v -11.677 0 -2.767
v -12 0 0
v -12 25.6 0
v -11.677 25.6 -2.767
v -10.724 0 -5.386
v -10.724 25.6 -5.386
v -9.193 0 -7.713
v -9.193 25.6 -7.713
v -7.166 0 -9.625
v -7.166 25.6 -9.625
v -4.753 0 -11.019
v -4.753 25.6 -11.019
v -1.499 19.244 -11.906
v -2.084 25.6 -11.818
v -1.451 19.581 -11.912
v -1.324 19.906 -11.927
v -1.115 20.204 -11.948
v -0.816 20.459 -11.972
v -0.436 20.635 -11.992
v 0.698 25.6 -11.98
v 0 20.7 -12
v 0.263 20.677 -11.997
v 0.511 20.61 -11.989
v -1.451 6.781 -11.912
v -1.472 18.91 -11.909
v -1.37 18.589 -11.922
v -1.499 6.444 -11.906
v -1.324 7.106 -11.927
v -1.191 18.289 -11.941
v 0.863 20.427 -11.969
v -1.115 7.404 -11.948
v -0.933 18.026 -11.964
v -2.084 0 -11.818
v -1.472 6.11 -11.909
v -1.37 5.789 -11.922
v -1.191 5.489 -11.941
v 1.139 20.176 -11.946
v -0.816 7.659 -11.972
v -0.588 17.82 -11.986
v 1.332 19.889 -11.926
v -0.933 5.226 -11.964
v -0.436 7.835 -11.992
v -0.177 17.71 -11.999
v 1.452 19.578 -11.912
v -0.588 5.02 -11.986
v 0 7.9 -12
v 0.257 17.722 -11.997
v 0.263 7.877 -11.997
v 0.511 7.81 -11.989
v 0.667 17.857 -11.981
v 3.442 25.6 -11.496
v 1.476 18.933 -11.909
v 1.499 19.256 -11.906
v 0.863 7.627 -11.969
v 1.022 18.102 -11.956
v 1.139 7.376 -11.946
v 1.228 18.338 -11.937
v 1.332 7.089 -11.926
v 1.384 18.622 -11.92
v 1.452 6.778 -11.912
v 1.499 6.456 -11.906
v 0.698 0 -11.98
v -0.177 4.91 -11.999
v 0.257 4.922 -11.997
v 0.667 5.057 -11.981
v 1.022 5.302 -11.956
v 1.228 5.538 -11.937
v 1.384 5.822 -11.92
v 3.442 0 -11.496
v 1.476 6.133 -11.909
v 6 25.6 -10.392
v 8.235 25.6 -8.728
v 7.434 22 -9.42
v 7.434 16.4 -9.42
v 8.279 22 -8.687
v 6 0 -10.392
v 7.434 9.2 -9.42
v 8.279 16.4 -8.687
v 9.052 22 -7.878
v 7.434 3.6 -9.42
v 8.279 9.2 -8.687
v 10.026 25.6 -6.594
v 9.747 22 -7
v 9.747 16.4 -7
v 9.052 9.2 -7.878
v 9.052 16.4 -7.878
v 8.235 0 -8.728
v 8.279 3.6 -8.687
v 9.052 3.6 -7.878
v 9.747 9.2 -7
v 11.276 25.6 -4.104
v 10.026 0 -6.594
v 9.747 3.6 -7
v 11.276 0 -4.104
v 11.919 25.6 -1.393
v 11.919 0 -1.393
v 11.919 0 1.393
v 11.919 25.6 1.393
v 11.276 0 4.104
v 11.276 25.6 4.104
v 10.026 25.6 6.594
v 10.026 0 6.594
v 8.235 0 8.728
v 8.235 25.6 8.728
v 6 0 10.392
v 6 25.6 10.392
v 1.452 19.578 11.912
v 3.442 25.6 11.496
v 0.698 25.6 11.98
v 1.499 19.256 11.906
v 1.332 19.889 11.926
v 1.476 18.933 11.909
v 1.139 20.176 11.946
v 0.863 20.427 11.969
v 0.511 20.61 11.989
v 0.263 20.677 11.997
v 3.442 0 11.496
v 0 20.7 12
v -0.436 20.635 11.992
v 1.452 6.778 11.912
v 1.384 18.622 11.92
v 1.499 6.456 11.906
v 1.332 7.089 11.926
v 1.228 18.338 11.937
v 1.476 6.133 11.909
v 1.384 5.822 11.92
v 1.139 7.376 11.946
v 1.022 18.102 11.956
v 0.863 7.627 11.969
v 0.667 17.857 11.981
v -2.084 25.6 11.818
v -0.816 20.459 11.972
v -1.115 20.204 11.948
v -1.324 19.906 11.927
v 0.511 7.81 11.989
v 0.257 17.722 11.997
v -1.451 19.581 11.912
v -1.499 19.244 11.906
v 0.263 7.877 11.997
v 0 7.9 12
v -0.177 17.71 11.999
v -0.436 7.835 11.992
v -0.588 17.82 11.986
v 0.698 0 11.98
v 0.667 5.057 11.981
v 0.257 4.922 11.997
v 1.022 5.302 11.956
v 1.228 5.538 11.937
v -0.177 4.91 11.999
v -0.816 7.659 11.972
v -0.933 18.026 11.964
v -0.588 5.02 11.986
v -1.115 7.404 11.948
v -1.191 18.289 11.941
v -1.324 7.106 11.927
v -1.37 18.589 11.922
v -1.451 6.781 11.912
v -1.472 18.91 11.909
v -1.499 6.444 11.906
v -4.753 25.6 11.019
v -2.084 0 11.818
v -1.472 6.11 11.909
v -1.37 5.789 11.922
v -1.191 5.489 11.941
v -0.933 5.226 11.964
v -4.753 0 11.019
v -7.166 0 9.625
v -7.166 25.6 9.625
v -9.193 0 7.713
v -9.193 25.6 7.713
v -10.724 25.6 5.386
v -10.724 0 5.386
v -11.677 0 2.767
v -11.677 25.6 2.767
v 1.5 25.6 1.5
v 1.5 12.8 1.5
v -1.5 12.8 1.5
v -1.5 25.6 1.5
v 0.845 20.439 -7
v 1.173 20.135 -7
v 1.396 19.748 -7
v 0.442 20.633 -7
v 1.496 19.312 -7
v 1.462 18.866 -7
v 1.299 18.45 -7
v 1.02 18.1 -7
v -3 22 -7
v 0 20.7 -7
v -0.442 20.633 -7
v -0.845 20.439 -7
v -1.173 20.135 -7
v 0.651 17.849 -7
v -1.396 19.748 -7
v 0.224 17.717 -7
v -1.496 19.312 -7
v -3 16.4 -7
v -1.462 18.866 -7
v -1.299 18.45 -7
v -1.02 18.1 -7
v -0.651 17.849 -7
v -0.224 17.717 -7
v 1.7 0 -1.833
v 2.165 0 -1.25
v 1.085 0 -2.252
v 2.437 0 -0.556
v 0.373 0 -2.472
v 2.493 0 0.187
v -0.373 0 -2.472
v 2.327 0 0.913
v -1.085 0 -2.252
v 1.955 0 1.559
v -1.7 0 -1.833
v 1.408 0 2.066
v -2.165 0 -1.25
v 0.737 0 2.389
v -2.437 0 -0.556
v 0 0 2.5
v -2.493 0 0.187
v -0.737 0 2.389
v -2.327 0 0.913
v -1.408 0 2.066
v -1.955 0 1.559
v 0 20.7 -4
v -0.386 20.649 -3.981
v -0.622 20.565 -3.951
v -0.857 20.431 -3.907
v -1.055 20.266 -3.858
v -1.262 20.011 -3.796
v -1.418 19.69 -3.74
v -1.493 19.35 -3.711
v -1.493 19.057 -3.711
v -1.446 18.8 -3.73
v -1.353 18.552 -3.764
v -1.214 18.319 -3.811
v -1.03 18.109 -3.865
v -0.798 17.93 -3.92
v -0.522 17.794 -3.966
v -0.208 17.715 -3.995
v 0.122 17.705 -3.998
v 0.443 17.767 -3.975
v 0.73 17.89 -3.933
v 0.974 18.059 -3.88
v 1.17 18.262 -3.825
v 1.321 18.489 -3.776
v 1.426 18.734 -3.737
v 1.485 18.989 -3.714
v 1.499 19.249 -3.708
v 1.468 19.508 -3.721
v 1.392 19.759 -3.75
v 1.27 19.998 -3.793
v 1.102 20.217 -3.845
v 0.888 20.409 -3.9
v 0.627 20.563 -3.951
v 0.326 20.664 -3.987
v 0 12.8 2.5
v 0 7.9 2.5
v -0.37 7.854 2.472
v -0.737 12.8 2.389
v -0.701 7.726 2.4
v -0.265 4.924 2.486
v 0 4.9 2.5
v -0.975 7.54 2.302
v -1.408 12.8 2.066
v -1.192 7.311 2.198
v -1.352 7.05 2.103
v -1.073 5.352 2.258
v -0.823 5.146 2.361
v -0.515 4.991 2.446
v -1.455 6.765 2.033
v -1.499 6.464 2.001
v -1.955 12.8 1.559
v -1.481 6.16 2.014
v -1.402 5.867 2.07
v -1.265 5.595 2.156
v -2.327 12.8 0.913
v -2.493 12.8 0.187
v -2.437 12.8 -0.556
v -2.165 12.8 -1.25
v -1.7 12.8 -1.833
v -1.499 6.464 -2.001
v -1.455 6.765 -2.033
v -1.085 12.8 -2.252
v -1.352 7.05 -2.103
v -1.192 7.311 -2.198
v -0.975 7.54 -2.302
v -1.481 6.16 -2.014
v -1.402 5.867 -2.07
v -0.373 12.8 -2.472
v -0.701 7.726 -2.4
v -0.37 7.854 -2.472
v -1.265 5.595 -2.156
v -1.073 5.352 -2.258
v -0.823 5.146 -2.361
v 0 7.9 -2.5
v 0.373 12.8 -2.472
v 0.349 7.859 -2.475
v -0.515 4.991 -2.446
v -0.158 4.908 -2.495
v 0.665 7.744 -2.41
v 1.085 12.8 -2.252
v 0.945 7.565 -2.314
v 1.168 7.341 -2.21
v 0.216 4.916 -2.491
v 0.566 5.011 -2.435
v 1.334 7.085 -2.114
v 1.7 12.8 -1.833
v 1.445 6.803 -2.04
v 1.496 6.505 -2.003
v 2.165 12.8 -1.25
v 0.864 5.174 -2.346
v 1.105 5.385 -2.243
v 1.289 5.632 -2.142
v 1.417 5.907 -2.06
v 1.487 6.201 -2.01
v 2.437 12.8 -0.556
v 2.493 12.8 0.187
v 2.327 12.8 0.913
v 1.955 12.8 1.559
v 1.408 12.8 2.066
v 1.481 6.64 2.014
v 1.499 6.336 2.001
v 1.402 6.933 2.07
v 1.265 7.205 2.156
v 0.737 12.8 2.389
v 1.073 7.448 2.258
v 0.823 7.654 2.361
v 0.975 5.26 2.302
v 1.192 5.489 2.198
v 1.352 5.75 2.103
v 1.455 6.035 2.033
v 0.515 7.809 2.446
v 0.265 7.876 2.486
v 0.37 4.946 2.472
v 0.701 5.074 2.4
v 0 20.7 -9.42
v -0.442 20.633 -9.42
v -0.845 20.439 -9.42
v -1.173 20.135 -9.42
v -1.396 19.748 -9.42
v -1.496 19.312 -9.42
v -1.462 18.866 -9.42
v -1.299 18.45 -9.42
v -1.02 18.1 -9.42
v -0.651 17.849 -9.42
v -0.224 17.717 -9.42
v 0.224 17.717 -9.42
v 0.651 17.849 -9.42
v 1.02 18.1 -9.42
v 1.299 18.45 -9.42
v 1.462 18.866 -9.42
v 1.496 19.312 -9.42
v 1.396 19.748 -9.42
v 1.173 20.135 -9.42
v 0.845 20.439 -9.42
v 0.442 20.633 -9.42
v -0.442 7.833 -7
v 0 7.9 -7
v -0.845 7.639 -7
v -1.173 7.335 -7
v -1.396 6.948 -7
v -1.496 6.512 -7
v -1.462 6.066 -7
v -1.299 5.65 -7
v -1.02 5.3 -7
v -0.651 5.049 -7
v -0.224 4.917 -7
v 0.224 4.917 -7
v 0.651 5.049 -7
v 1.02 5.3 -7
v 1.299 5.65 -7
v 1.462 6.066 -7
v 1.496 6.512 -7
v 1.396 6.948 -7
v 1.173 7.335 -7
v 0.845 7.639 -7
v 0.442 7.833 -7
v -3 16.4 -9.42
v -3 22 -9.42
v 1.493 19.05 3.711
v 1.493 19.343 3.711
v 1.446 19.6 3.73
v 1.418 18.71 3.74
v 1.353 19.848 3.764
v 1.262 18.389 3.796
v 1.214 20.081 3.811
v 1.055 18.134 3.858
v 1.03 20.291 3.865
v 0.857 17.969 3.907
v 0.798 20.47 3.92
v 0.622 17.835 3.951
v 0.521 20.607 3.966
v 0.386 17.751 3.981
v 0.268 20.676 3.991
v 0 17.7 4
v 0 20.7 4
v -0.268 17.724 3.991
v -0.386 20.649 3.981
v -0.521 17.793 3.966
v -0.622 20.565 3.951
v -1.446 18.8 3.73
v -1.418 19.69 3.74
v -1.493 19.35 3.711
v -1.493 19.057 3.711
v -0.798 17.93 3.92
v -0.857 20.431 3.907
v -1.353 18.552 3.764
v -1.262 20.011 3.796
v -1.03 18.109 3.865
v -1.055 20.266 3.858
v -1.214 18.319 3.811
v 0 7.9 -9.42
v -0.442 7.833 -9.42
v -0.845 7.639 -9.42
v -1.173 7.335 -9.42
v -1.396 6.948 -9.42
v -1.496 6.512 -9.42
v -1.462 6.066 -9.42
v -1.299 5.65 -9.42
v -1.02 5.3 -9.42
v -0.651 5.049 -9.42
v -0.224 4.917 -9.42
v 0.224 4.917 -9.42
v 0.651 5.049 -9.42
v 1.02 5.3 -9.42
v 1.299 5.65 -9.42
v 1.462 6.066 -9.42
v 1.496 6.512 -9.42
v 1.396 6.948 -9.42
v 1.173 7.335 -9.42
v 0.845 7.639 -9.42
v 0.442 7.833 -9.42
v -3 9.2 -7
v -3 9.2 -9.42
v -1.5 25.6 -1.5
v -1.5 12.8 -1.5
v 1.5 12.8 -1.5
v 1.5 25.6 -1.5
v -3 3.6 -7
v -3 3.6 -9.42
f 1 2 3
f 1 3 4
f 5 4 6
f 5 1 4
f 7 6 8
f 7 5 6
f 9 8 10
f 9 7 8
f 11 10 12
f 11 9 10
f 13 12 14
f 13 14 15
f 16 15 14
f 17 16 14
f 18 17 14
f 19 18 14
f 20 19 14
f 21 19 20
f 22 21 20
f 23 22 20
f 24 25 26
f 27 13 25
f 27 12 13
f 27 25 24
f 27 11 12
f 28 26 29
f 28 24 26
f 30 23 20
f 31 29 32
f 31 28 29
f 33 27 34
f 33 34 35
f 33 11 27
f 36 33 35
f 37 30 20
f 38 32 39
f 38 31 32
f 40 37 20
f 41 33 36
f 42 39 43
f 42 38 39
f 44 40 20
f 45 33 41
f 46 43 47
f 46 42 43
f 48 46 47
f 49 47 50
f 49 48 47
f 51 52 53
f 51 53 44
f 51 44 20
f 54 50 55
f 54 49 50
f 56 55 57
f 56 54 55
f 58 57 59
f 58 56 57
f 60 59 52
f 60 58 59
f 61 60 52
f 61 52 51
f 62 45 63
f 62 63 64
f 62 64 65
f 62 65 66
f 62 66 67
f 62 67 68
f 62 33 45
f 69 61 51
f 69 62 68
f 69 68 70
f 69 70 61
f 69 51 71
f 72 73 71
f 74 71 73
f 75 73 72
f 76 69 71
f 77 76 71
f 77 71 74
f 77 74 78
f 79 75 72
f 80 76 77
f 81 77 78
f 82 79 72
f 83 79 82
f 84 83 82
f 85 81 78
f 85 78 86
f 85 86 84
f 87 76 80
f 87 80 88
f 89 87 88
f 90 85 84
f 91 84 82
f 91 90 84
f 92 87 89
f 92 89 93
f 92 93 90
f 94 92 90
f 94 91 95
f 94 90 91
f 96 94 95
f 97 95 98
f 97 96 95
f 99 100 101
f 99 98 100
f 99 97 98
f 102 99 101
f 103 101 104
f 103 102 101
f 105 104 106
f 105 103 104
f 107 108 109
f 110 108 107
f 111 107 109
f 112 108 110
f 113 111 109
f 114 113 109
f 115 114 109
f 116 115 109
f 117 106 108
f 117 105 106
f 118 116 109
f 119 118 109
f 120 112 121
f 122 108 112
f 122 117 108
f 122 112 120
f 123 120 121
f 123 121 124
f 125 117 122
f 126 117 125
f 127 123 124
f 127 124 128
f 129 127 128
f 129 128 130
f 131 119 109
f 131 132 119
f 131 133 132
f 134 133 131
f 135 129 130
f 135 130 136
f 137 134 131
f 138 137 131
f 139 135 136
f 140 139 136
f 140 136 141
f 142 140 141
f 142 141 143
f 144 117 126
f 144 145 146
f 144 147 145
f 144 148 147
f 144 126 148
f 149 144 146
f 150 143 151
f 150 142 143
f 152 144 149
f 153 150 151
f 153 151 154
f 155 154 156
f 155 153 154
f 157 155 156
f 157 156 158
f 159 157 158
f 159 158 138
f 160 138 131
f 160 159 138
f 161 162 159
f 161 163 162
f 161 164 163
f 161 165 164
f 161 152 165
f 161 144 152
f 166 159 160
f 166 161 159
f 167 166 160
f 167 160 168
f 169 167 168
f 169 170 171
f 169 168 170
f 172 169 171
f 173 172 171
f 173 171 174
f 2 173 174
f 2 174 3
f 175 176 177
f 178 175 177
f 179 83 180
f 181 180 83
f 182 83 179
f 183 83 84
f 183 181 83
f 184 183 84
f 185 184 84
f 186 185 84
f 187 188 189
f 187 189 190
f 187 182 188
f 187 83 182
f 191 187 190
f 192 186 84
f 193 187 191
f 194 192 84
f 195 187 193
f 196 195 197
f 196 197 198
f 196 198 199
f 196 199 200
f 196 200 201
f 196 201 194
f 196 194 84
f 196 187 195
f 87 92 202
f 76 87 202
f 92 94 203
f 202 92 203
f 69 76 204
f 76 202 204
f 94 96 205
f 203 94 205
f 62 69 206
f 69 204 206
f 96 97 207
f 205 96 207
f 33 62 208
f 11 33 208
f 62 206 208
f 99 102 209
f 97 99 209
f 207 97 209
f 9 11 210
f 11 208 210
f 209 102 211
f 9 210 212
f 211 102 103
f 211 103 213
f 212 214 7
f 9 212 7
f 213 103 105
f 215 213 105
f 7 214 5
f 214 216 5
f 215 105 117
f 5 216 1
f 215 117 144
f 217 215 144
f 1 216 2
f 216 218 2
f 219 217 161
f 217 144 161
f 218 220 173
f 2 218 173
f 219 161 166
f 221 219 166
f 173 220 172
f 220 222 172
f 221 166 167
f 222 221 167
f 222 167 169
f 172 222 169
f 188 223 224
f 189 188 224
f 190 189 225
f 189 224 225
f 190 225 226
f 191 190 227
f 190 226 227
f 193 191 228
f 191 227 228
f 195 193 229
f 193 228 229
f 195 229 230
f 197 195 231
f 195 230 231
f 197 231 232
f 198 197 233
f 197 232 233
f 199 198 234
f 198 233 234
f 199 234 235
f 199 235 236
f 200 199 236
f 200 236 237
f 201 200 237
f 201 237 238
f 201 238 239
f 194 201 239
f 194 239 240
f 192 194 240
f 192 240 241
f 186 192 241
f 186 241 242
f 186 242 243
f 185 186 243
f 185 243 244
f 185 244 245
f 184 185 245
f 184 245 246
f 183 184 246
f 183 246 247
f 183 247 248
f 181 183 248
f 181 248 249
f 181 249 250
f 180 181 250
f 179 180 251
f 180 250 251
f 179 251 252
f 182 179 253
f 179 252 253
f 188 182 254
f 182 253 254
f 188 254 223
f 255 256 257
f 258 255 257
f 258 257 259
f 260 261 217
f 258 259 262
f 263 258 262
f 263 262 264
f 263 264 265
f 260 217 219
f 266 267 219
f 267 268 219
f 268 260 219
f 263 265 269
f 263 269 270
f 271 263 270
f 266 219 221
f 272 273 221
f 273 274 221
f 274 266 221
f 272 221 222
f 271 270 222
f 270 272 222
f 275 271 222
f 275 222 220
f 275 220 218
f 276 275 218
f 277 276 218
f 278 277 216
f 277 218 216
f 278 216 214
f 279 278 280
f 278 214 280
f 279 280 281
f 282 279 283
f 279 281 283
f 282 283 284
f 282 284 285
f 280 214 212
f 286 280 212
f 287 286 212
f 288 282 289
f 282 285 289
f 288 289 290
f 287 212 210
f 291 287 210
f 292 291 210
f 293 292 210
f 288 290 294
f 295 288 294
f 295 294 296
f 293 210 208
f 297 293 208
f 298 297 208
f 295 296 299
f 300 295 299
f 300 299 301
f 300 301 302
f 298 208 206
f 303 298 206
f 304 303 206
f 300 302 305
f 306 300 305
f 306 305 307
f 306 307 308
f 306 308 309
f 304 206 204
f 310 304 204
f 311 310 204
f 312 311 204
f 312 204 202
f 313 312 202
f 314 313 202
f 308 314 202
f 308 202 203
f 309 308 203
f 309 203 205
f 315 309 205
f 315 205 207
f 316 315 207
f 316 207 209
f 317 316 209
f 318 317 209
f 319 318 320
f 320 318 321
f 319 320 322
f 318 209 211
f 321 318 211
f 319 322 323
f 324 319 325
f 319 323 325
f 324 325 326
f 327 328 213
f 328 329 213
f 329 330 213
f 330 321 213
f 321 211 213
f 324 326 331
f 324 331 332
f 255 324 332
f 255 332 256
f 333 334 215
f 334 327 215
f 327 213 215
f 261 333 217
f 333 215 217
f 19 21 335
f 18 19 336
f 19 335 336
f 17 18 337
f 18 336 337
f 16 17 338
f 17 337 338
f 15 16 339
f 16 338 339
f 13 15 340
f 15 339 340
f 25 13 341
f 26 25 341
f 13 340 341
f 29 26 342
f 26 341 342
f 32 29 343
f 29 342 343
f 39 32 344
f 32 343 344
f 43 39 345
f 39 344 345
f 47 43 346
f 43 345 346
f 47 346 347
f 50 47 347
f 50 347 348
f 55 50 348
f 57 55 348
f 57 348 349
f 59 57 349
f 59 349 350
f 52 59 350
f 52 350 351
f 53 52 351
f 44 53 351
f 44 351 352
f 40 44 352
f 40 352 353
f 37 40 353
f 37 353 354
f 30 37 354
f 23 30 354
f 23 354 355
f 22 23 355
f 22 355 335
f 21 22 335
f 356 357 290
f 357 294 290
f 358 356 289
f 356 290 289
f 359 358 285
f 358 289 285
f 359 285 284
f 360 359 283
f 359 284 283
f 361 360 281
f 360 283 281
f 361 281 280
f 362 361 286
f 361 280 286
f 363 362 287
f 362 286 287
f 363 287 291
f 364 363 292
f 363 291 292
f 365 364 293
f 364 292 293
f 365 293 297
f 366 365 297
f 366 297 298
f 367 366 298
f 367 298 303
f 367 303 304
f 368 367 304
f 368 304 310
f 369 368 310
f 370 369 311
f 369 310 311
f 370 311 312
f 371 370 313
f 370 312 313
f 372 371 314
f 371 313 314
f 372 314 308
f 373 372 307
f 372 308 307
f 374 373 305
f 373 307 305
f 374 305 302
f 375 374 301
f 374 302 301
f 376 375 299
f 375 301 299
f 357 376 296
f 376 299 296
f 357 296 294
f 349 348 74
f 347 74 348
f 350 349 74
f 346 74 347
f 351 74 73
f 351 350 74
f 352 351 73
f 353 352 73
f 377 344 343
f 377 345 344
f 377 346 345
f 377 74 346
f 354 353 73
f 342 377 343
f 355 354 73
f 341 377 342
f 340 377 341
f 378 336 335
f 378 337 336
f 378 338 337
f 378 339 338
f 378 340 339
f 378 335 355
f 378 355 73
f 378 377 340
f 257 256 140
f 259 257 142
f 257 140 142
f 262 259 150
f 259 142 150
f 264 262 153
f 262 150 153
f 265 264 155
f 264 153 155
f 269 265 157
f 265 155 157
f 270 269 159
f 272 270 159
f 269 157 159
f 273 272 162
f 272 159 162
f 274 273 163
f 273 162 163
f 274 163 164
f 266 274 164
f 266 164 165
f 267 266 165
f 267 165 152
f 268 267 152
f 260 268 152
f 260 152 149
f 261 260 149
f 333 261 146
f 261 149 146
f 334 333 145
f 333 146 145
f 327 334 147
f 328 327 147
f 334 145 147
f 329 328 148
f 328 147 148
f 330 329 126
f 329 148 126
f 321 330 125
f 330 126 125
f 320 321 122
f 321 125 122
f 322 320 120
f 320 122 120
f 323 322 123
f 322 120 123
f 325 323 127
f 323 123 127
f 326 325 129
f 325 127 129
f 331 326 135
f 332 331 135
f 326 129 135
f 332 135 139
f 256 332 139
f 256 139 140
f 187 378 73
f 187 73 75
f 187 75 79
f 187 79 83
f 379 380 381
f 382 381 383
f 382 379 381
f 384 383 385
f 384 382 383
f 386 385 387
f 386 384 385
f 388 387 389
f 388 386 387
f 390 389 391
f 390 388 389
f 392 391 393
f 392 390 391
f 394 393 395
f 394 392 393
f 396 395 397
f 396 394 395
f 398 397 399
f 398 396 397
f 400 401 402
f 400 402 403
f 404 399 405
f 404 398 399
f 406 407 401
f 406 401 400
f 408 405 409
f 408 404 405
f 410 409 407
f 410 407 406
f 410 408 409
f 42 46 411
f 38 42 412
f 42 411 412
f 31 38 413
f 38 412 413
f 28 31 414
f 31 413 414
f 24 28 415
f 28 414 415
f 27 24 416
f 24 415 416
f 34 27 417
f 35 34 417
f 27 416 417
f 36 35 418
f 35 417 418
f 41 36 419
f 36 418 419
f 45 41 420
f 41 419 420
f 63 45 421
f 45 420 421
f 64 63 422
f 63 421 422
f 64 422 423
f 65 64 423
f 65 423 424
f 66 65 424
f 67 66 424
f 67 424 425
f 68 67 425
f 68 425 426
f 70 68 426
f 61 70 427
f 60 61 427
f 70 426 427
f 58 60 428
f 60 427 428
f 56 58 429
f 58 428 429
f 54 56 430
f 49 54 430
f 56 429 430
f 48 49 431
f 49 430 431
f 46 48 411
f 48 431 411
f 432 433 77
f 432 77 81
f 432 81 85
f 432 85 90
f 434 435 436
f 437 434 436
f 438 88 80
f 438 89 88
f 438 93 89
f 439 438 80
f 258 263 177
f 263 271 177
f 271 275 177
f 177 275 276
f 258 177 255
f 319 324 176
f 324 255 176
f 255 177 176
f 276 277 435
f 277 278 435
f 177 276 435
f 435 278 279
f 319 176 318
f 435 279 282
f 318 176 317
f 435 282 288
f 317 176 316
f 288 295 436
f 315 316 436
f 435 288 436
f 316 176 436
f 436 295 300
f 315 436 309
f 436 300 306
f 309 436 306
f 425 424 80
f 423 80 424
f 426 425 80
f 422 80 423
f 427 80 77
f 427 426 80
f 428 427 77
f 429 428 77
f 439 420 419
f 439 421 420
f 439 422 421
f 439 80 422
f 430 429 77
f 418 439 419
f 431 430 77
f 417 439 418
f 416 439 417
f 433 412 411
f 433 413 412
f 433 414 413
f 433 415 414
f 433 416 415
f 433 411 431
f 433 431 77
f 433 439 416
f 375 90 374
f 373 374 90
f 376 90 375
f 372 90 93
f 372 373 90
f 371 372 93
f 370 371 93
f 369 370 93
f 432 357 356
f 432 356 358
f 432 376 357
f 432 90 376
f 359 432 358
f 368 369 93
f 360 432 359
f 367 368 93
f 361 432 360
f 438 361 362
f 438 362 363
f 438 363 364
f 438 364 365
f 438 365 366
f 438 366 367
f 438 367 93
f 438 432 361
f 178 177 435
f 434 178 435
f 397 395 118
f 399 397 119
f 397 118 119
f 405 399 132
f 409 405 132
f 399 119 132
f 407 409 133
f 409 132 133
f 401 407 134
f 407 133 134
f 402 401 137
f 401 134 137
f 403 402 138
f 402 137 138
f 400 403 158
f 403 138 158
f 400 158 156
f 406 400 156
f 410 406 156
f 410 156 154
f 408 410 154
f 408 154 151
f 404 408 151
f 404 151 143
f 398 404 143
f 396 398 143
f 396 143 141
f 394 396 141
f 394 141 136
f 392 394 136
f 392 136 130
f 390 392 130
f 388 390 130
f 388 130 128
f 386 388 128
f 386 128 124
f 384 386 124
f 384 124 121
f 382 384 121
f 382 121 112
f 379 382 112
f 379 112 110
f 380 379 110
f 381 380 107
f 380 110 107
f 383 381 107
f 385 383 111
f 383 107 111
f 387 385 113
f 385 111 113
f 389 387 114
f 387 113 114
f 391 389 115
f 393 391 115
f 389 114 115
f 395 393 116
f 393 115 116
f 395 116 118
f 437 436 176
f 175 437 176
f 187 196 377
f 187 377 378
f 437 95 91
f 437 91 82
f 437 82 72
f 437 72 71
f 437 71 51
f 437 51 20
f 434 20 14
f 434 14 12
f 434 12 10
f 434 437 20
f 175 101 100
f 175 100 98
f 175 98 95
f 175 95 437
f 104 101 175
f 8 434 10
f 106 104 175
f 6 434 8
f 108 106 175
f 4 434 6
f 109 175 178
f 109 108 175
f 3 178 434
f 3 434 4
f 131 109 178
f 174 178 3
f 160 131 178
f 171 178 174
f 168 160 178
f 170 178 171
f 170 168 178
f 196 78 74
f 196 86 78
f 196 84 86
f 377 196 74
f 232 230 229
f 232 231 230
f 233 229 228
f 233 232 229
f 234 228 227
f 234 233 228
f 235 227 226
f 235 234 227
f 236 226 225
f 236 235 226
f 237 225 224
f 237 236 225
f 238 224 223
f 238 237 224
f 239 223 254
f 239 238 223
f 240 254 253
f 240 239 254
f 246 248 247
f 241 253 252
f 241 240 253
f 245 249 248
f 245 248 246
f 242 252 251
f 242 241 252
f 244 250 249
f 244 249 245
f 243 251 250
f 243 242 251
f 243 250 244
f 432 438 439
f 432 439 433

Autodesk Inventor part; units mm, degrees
ref_plane "YZ Plane" through (0, 0, 0) normal (1, 0, 0) x (0, 1, 0)
ref_plane "XZ Plane" through (0, 0, 0) normal (0, 1, 0) x (-1, 0, 0)
ref_plane "XY Plane" through (0, 0, 0) normal (0, 0, 1) x (1, 0, 0)
sketch "Boceto1" plane through (0, 0, 0) normal (0, 1, 0) x (-1, 0, 0)
  circle A0 centre (0, 0) radius 12
  dimension "d0" = 24
extrude "Extrusión1" add sketch "Boceto1" along normal blind 25.6
sketch "Boceto2" plane through (0, 25.6, 0) normal (0, 1, 0) x (1, 0, 0)
  point P0 (0, 0)
  point P1 (0, 0)
hole "Agujero1" at (0, 25.6, 0) direction (0, -1, 0) diameter 5 depth 35 tip angle 118
sketch "Boceto3" plane through (0, 25.6, 0) normal (0, 1, 0) x (1, 0, 0)
  point P0 (0, 0)
  point P1 (0, 0)
hole "Agujero2" at (0, 25.6, 0) direction (0, -1, 0) diameter 8 depth 12.8
sketch "Boceto4" plane through (0, 0, 0) normal (1, 0, 0) x (0, 1, 0)
  line L0 (9.2, -7) -> (3.6, -7)
  line L1 (3.6, -7) -> (3.6, -9.42)
  line L2 (3.6, -9.42) -> (9.2, -9.42)
  line L3 (9.2, -9.42) -> (9.2, -7)
  line L4 (25.6, -12) -> (25.6, 12) construction
  line L5 (0, 12) -> (0, -12) construction
  line L6 (12.8, -2.5) -> (12.8, 2.5) construction
  line L7 (0, -2.5) -> (0, 2.5) construction
  line L8 (19.2, 26.4321) -> (19.2, -18.0419) construction
  line L9 (6.4, 12.9466) -> (6.4, -18.0419) construction
  line L10 (22, -7) -> (16.4, -7)
  line L11 (16.4, -7) -> (16.4, -9.42)
  line L12 (16.4, -9.42) -> (22, -9.42)
  line L13 (22, -9.42) -> (22, -7)
  line L14 (0, -2.5) -> (0, 2.5) construction
  point P0 (0, 0)
  point P1 (6.4, -7)
  point P2 (19.2, -7)
  dimension "d17" = 5.6
  dimension "d18" = 2.42
  dimension "d19" = 6.4
  dimension "d20" = 6.4
  dimension "d21" = 5.6
  dimension "d22" = 2.42
  dimension "d23" = 9.42
  dimension "d24" = 9.42
extrude "Extrusión2" cut sketch "Boceto4" along normal blind 10 and the other way blind 3
sketch "Boceto5" plane through (9.7468, 16.4, -7) normal (0, 0, -1) x (-1, 0, 0)
  line L0 (0, -7.2) -> (2.3128, -7.2) construction
  line L1 (2.3128, -7.2) -> (2.3128, -12.8) construction
  line L2 (2.3128, -12.8) -> (0, -12.8) construction
  line L3 (0, -12.8) -> (0, -7.2) construction
  line L4 (0, 5.6) -> (2.3128, 5.6) construction
  line L5 (2.3128, 5.6) -> (2.3128, 0) construction
  line L6 (2.3128, 0) -> (0, 0) construction
  line L7 (0, 0) -> (0, 5.6) construction
  line L8 (21.7468, 9.2) -> (-2.2532, 9.2) construction
  line L9 (-2.2532, -16.4) -> (21.7468, -16.4) construction
  point P0 (9.7468, -16.4)
  point P1 (9.7468, 2.8)
  point P2 (9.7468, -10)
  point P3 (2.3128, -10)
  point P4 (2.3128, 2.8)
hole "Agujero3" at (0, 19.2, -7) at (0, 6.4, -7) direction (0, 0, 1) diameter 3 end through all both
sketch "Boceto6" plane through (0, 12.8, 0) normal (0, 1, 0) x (1, 0, 0)
  circle A0 centre (0, 0) radius 4 construction
  circle A1 centre (0, 0) radius 12 construction
  circle A2 centre (0, 0) radius 2.5 construction
  line L0 (1.5, -1.5) -> (-1.5, -1.5)
  line L1 (-1.5, -1.5) -> (-1.5, 1.5)
  line L2 (-1.5, 1.5) -> (1.5, 1.5)
  line L3 (1.5, 1.5) -> (1.5, -1.5)
  line L4 (-1.5, 1.5) -> (1.5, -1.5) construction
  line L5 (1.5, 1.5) -> (-1.5, -1.5) construction
  circle A3 centre (0, 0) radius 4
  dimension "d36" = 3
  dimension "d37" = 3
  dimension "d38" = 8
extrude "Extrusión3" add sketch "Boceto6" along normal up to surface (12.8 mm away)
equation "\"d20\" = d19"
equation "\"d24\" = d23"
properties part number "Coupler 5x8"
